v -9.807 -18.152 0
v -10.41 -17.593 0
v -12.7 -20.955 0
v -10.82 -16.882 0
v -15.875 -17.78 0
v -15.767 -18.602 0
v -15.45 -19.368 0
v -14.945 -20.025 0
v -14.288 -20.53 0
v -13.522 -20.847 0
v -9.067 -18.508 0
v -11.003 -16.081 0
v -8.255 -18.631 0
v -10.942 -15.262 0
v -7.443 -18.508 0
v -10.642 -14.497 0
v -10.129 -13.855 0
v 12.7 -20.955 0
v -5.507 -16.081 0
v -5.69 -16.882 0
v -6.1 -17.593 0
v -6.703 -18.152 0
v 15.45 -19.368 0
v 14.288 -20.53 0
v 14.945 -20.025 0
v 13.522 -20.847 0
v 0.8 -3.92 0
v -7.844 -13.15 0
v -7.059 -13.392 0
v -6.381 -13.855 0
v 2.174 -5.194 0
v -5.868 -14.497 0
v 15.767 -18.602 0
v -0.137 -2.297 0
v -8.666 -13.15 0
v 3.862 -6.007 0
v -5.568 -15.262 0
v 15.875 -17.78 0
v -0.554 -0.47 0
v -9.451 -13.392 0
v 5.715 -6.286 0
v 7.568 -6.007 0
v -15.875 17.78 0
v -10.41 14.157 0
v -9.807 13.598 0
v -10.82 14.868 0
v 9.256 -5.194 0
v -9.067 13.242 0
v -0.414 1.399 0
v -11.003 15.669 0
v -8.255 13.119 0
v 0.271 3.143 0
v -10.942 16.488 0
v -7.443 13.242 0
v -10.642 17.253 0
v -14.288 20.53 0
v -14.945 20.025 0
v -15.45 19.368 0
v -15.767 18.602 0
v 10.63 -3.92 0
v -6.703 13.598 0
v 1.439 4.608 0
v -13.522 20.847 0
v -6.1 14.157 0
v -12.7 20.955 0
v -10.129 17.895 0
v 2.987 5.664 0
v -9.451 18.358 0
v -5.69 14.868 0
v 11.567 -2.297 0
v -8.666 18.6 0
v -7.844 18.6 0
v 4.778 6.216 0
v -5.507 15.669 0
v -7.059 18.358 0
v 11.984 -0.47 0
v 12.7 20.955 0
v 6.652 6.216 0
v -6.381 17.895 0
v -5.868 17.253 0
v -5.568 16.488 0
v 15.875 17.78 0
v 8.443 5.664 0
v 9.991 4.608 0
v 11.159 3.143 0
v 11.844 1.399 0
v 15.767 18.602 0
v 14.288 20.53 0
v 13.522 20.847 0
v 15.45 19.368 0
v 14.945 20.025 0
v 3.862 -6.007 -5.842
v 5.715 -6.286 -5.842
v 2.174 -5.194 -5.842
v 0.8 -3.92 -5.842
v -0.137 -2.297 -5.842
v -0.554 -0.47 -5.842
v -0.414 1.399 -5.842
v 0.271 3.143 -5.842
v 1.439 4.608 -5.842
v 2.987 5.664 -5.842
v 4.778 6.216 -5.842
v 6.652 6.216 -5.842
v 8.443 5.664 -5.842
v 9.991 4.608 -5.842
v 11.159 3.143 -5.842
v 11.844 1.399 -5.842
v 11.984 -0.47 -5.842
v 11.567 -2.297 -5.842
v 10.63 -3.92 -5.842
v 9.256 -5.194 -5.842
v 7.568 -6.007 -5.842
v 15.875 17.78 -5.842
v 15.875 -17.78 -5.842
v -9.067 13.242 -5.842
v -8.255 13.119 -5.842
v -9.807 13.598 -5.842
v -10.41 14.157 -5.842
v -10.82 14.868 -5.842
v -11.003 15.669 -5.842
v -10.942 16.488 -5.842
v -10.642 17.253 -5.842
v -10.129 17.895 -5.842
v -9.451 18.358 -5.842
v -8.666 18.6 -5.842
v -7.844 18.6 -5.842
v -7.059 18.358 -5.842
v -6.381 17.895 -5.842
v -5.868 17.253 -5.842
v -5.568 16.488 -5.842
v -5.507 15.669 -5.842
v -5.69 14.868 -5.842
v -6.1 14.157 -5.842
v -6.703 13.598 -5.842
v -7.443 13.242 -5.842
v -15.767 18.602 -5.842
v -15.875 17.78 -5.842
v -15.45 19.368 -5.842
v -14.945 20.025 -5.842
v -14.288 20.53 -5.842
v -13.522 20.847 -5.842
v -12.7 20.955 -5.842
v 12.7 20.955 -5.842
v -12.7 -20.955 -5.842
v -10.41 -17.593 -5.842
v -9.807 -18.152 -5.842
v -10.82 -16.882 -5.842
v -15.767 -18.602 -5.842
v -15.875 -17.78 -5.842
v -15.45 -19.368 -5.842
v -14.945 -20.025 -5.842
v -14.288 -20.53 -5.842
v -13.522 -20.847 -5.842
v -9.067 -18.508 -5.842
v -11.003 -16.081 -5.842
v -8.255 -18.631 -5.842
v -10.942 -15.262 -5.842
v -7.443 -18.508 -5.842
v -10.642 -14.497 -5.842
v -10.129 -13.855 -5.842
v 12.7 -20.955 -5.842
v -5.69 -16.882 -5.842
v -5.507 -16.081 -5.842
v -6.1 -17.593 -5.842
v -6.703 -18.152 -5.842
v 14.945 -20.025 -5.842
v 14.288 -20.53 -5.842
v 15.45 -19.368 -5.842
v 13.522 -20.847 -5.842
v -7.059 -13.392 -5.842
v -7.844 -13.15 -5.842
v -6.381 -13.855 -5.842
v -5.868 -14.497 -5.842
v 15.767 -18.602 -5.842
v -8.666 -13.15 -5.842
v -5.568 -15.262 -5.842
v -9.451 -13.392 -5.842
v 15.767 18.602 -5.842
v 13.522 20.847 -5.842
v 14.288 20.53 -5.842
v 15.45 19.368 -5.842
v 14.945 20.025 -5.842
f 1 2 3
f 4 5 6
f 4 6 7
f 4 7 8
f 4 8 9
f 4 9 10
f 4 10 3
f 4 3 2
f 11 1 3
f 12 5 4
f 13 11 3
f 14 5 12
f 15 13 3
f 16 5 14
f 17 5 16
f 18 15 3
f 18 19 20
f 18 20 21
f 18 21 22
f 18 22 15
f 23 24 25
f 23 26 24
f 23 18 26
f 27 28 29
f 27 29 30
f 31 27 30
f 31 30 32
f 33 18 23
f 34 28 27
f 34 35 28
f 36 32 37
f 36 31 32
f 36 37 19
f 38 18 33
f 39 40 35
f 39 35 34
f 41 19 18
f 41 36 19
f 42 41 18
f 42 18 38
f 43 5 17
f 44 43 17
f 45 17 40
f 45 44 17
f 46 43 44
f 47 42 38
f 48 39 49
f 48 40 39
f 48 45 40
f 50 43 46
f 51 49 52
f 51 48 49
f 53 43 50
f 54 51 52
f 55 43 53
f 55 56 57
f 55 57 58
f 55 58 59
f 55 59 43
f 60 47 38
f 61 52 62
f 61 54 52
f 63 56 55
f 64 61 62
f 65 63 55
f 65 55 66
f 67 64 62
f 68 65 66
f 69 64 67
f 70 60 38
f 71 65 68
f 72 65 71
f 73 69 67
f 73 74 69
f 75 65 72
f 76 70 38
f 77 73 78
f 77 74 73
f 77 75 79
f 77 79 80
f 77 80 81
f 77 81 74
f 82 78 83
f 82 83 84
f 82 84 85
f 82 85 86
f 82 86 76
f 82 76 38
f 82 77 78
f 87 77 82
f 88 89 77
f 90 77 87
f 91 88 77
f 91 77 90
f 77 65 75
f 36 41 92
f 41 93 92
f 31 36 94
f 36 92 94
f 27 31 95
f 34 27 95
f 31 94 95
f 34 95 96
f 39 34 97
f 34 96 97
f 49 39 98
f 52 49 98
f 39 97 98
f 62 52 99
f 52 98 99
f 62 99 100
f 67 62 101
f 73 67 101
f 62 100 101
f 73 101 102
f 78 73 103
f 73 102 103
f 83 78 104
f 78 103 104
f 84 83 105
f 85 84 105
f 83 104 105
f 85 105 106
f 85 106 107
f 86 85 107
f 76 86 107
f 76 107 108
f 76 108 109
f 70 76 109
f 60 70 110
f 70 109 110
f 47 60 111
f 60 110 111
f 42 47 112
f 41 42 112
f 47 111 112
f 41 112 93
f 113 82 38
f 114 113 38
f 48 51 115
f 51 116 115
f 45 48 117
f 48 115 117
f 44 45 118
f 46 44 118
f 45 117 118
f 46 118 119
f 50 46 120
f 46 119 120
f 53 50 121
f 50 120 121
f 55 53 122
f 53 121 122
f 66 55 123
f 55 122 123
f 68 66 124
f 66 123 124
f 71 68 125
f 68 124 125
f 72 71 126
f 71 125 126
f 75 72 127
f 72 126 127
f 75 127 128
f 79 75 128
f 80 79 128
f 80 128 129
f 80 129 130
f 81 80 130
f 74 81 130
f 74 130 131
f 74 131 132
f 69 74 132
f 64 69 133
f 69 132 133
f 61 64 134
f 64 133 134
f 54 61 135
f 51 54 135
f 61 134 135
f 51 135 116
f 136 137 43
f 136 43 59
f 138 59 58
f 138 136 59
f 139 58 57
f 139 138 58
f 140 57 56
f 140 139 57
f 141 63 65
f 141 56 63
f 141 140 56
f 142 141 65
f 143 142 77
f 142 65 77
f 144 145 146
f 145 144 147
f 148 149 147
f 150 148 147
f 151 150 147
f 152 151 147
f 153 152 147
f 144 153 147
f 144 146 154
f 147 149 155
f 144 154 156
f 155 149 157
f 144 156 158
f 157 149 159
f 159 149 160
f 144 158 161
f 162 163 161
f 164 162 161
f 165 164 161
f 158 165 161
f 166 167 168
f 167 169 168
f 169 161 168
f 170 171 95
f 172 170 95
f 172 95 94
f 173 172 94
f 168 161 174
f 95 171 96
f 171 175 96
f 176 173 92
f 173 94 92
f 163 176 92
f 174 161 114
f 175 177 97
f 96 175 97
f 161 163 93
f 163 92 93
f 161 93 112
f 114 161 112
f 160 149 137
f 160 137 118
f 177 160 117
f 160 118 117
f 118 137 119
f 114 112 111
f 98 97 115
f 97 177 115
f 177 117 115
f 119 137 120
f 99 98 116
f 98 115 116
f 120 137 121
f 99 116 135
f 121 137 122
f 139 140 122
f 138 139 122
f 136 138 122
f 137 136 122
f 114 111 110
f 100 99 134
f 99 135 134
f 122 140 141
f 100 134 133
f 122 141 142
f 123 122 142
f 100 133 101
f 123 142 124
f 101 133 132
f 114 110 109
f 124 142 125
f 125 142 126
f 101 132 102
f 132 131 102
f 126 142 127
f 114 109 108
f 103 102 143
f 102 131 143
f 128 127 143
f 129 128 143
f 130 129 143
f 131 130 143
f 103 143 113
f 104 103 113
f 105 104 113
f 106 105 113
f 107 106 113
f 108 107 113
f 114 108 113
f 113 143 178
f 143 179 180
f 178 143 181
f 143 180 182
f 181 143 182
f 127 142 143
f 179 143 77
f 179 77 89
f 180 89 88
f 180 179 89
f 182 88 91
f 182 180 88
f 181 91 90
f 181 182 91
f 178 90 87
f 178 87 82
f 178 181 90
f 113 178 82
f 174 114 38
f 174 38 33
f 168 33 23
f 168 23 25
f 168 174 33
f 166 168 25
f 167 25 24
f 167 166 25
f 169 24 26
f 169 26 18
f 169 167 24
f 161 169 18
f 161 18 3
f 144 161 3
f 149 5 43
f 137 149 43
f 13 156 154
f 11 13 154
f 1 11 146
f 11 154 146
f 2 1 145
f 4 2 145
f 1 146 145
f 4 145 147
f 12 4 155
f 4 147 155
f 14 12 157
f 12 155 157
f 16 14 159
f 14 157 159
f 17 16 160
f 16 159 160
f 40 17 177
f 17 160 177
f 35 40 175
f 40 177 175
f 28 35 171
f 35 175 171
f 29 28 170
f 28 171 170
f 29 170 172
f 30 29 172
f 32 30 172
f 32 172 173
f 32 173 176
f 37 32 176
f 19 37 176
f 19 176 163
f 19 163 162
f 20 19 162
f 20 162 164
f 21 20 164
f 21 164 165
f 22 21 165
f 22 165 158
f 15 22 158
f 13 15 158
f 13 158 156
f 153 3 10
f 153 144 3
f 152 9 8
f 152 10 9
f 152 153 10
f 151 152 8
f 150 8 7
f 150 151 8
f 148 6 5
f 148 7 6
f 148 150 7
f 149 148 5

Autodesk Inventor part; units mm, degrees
ref_plane "YZ Plane" through (0, 0, 0) normal (1, 0, 0) x (0, 1, 0)
ref_plane "XZ Plane" through (0, 0, 0) normal (0, 1, 0) x (-1, 0, 0)
ref_plane "XY Plane" through (0, 0, 0) normal (0, 0, 1) x (1, 0, 0)
sketch "Sketch1" plane through (0, 0, 0) normal (0, 0, 1) x (1, 0, 0)
  line L0 (0, 29.337) -> (0, -29.337) projected
  line L1 (-22.225, 0) -> (22.225, 0) projected
  line L2 (15.875, -20.955) -> (-15.875, -20.955)
  line L3 (-15.875, -20.955) -> (-15.875, 20.955)
  line L4 (-15.875, 20.955) -> (15.875, 20.955)
  line L5 (15.875, 20.955) -> (15.875, -20.955)
  line L6 (15.875, -20.955) -> (-15.875, 20.955) construction
  line L7 (-15.875, -20.955) -> (15.875, 20.955) construction
  point P0 (0, 0)
  point P1 (-8.255, 15.875)
  point P2 (-8.255, -15.875)
  point P3 (5.715, 0)
  dimension "d0" = 41.91
  dimension "d1" = 31.75
  dimension "d2" = 31.75
  dimension "d3" = 15.875
  dimension "d4" = 7.62
  dimension "d5" = 10.16
extrude "Extrusion1" add sketch "Sketch1" against normal blind 5.842
hole "Hole1" at (-8.255, 15.875, 0) at (-8.255, -15.875, 0) direction (0, 0, -1) diameter 5.5118 end through all clearance for "Socket Head Cap Screw" size "M5" standard "Ansi Metric M Profile"
hole "Hole2" at (5.715, 0, 0) direction (0, 0, -1) diameter 12.573 end through all
fillet "Fillet1" radius 3.175 4 edges at (-15.875, -20.955, -2.921) (15.875, -20.955, -2.921) (15.875, 20.955, -2.921) (-15.875, 20.955, -2.921)
equation "\"d3\" = 0.5 * d2"
